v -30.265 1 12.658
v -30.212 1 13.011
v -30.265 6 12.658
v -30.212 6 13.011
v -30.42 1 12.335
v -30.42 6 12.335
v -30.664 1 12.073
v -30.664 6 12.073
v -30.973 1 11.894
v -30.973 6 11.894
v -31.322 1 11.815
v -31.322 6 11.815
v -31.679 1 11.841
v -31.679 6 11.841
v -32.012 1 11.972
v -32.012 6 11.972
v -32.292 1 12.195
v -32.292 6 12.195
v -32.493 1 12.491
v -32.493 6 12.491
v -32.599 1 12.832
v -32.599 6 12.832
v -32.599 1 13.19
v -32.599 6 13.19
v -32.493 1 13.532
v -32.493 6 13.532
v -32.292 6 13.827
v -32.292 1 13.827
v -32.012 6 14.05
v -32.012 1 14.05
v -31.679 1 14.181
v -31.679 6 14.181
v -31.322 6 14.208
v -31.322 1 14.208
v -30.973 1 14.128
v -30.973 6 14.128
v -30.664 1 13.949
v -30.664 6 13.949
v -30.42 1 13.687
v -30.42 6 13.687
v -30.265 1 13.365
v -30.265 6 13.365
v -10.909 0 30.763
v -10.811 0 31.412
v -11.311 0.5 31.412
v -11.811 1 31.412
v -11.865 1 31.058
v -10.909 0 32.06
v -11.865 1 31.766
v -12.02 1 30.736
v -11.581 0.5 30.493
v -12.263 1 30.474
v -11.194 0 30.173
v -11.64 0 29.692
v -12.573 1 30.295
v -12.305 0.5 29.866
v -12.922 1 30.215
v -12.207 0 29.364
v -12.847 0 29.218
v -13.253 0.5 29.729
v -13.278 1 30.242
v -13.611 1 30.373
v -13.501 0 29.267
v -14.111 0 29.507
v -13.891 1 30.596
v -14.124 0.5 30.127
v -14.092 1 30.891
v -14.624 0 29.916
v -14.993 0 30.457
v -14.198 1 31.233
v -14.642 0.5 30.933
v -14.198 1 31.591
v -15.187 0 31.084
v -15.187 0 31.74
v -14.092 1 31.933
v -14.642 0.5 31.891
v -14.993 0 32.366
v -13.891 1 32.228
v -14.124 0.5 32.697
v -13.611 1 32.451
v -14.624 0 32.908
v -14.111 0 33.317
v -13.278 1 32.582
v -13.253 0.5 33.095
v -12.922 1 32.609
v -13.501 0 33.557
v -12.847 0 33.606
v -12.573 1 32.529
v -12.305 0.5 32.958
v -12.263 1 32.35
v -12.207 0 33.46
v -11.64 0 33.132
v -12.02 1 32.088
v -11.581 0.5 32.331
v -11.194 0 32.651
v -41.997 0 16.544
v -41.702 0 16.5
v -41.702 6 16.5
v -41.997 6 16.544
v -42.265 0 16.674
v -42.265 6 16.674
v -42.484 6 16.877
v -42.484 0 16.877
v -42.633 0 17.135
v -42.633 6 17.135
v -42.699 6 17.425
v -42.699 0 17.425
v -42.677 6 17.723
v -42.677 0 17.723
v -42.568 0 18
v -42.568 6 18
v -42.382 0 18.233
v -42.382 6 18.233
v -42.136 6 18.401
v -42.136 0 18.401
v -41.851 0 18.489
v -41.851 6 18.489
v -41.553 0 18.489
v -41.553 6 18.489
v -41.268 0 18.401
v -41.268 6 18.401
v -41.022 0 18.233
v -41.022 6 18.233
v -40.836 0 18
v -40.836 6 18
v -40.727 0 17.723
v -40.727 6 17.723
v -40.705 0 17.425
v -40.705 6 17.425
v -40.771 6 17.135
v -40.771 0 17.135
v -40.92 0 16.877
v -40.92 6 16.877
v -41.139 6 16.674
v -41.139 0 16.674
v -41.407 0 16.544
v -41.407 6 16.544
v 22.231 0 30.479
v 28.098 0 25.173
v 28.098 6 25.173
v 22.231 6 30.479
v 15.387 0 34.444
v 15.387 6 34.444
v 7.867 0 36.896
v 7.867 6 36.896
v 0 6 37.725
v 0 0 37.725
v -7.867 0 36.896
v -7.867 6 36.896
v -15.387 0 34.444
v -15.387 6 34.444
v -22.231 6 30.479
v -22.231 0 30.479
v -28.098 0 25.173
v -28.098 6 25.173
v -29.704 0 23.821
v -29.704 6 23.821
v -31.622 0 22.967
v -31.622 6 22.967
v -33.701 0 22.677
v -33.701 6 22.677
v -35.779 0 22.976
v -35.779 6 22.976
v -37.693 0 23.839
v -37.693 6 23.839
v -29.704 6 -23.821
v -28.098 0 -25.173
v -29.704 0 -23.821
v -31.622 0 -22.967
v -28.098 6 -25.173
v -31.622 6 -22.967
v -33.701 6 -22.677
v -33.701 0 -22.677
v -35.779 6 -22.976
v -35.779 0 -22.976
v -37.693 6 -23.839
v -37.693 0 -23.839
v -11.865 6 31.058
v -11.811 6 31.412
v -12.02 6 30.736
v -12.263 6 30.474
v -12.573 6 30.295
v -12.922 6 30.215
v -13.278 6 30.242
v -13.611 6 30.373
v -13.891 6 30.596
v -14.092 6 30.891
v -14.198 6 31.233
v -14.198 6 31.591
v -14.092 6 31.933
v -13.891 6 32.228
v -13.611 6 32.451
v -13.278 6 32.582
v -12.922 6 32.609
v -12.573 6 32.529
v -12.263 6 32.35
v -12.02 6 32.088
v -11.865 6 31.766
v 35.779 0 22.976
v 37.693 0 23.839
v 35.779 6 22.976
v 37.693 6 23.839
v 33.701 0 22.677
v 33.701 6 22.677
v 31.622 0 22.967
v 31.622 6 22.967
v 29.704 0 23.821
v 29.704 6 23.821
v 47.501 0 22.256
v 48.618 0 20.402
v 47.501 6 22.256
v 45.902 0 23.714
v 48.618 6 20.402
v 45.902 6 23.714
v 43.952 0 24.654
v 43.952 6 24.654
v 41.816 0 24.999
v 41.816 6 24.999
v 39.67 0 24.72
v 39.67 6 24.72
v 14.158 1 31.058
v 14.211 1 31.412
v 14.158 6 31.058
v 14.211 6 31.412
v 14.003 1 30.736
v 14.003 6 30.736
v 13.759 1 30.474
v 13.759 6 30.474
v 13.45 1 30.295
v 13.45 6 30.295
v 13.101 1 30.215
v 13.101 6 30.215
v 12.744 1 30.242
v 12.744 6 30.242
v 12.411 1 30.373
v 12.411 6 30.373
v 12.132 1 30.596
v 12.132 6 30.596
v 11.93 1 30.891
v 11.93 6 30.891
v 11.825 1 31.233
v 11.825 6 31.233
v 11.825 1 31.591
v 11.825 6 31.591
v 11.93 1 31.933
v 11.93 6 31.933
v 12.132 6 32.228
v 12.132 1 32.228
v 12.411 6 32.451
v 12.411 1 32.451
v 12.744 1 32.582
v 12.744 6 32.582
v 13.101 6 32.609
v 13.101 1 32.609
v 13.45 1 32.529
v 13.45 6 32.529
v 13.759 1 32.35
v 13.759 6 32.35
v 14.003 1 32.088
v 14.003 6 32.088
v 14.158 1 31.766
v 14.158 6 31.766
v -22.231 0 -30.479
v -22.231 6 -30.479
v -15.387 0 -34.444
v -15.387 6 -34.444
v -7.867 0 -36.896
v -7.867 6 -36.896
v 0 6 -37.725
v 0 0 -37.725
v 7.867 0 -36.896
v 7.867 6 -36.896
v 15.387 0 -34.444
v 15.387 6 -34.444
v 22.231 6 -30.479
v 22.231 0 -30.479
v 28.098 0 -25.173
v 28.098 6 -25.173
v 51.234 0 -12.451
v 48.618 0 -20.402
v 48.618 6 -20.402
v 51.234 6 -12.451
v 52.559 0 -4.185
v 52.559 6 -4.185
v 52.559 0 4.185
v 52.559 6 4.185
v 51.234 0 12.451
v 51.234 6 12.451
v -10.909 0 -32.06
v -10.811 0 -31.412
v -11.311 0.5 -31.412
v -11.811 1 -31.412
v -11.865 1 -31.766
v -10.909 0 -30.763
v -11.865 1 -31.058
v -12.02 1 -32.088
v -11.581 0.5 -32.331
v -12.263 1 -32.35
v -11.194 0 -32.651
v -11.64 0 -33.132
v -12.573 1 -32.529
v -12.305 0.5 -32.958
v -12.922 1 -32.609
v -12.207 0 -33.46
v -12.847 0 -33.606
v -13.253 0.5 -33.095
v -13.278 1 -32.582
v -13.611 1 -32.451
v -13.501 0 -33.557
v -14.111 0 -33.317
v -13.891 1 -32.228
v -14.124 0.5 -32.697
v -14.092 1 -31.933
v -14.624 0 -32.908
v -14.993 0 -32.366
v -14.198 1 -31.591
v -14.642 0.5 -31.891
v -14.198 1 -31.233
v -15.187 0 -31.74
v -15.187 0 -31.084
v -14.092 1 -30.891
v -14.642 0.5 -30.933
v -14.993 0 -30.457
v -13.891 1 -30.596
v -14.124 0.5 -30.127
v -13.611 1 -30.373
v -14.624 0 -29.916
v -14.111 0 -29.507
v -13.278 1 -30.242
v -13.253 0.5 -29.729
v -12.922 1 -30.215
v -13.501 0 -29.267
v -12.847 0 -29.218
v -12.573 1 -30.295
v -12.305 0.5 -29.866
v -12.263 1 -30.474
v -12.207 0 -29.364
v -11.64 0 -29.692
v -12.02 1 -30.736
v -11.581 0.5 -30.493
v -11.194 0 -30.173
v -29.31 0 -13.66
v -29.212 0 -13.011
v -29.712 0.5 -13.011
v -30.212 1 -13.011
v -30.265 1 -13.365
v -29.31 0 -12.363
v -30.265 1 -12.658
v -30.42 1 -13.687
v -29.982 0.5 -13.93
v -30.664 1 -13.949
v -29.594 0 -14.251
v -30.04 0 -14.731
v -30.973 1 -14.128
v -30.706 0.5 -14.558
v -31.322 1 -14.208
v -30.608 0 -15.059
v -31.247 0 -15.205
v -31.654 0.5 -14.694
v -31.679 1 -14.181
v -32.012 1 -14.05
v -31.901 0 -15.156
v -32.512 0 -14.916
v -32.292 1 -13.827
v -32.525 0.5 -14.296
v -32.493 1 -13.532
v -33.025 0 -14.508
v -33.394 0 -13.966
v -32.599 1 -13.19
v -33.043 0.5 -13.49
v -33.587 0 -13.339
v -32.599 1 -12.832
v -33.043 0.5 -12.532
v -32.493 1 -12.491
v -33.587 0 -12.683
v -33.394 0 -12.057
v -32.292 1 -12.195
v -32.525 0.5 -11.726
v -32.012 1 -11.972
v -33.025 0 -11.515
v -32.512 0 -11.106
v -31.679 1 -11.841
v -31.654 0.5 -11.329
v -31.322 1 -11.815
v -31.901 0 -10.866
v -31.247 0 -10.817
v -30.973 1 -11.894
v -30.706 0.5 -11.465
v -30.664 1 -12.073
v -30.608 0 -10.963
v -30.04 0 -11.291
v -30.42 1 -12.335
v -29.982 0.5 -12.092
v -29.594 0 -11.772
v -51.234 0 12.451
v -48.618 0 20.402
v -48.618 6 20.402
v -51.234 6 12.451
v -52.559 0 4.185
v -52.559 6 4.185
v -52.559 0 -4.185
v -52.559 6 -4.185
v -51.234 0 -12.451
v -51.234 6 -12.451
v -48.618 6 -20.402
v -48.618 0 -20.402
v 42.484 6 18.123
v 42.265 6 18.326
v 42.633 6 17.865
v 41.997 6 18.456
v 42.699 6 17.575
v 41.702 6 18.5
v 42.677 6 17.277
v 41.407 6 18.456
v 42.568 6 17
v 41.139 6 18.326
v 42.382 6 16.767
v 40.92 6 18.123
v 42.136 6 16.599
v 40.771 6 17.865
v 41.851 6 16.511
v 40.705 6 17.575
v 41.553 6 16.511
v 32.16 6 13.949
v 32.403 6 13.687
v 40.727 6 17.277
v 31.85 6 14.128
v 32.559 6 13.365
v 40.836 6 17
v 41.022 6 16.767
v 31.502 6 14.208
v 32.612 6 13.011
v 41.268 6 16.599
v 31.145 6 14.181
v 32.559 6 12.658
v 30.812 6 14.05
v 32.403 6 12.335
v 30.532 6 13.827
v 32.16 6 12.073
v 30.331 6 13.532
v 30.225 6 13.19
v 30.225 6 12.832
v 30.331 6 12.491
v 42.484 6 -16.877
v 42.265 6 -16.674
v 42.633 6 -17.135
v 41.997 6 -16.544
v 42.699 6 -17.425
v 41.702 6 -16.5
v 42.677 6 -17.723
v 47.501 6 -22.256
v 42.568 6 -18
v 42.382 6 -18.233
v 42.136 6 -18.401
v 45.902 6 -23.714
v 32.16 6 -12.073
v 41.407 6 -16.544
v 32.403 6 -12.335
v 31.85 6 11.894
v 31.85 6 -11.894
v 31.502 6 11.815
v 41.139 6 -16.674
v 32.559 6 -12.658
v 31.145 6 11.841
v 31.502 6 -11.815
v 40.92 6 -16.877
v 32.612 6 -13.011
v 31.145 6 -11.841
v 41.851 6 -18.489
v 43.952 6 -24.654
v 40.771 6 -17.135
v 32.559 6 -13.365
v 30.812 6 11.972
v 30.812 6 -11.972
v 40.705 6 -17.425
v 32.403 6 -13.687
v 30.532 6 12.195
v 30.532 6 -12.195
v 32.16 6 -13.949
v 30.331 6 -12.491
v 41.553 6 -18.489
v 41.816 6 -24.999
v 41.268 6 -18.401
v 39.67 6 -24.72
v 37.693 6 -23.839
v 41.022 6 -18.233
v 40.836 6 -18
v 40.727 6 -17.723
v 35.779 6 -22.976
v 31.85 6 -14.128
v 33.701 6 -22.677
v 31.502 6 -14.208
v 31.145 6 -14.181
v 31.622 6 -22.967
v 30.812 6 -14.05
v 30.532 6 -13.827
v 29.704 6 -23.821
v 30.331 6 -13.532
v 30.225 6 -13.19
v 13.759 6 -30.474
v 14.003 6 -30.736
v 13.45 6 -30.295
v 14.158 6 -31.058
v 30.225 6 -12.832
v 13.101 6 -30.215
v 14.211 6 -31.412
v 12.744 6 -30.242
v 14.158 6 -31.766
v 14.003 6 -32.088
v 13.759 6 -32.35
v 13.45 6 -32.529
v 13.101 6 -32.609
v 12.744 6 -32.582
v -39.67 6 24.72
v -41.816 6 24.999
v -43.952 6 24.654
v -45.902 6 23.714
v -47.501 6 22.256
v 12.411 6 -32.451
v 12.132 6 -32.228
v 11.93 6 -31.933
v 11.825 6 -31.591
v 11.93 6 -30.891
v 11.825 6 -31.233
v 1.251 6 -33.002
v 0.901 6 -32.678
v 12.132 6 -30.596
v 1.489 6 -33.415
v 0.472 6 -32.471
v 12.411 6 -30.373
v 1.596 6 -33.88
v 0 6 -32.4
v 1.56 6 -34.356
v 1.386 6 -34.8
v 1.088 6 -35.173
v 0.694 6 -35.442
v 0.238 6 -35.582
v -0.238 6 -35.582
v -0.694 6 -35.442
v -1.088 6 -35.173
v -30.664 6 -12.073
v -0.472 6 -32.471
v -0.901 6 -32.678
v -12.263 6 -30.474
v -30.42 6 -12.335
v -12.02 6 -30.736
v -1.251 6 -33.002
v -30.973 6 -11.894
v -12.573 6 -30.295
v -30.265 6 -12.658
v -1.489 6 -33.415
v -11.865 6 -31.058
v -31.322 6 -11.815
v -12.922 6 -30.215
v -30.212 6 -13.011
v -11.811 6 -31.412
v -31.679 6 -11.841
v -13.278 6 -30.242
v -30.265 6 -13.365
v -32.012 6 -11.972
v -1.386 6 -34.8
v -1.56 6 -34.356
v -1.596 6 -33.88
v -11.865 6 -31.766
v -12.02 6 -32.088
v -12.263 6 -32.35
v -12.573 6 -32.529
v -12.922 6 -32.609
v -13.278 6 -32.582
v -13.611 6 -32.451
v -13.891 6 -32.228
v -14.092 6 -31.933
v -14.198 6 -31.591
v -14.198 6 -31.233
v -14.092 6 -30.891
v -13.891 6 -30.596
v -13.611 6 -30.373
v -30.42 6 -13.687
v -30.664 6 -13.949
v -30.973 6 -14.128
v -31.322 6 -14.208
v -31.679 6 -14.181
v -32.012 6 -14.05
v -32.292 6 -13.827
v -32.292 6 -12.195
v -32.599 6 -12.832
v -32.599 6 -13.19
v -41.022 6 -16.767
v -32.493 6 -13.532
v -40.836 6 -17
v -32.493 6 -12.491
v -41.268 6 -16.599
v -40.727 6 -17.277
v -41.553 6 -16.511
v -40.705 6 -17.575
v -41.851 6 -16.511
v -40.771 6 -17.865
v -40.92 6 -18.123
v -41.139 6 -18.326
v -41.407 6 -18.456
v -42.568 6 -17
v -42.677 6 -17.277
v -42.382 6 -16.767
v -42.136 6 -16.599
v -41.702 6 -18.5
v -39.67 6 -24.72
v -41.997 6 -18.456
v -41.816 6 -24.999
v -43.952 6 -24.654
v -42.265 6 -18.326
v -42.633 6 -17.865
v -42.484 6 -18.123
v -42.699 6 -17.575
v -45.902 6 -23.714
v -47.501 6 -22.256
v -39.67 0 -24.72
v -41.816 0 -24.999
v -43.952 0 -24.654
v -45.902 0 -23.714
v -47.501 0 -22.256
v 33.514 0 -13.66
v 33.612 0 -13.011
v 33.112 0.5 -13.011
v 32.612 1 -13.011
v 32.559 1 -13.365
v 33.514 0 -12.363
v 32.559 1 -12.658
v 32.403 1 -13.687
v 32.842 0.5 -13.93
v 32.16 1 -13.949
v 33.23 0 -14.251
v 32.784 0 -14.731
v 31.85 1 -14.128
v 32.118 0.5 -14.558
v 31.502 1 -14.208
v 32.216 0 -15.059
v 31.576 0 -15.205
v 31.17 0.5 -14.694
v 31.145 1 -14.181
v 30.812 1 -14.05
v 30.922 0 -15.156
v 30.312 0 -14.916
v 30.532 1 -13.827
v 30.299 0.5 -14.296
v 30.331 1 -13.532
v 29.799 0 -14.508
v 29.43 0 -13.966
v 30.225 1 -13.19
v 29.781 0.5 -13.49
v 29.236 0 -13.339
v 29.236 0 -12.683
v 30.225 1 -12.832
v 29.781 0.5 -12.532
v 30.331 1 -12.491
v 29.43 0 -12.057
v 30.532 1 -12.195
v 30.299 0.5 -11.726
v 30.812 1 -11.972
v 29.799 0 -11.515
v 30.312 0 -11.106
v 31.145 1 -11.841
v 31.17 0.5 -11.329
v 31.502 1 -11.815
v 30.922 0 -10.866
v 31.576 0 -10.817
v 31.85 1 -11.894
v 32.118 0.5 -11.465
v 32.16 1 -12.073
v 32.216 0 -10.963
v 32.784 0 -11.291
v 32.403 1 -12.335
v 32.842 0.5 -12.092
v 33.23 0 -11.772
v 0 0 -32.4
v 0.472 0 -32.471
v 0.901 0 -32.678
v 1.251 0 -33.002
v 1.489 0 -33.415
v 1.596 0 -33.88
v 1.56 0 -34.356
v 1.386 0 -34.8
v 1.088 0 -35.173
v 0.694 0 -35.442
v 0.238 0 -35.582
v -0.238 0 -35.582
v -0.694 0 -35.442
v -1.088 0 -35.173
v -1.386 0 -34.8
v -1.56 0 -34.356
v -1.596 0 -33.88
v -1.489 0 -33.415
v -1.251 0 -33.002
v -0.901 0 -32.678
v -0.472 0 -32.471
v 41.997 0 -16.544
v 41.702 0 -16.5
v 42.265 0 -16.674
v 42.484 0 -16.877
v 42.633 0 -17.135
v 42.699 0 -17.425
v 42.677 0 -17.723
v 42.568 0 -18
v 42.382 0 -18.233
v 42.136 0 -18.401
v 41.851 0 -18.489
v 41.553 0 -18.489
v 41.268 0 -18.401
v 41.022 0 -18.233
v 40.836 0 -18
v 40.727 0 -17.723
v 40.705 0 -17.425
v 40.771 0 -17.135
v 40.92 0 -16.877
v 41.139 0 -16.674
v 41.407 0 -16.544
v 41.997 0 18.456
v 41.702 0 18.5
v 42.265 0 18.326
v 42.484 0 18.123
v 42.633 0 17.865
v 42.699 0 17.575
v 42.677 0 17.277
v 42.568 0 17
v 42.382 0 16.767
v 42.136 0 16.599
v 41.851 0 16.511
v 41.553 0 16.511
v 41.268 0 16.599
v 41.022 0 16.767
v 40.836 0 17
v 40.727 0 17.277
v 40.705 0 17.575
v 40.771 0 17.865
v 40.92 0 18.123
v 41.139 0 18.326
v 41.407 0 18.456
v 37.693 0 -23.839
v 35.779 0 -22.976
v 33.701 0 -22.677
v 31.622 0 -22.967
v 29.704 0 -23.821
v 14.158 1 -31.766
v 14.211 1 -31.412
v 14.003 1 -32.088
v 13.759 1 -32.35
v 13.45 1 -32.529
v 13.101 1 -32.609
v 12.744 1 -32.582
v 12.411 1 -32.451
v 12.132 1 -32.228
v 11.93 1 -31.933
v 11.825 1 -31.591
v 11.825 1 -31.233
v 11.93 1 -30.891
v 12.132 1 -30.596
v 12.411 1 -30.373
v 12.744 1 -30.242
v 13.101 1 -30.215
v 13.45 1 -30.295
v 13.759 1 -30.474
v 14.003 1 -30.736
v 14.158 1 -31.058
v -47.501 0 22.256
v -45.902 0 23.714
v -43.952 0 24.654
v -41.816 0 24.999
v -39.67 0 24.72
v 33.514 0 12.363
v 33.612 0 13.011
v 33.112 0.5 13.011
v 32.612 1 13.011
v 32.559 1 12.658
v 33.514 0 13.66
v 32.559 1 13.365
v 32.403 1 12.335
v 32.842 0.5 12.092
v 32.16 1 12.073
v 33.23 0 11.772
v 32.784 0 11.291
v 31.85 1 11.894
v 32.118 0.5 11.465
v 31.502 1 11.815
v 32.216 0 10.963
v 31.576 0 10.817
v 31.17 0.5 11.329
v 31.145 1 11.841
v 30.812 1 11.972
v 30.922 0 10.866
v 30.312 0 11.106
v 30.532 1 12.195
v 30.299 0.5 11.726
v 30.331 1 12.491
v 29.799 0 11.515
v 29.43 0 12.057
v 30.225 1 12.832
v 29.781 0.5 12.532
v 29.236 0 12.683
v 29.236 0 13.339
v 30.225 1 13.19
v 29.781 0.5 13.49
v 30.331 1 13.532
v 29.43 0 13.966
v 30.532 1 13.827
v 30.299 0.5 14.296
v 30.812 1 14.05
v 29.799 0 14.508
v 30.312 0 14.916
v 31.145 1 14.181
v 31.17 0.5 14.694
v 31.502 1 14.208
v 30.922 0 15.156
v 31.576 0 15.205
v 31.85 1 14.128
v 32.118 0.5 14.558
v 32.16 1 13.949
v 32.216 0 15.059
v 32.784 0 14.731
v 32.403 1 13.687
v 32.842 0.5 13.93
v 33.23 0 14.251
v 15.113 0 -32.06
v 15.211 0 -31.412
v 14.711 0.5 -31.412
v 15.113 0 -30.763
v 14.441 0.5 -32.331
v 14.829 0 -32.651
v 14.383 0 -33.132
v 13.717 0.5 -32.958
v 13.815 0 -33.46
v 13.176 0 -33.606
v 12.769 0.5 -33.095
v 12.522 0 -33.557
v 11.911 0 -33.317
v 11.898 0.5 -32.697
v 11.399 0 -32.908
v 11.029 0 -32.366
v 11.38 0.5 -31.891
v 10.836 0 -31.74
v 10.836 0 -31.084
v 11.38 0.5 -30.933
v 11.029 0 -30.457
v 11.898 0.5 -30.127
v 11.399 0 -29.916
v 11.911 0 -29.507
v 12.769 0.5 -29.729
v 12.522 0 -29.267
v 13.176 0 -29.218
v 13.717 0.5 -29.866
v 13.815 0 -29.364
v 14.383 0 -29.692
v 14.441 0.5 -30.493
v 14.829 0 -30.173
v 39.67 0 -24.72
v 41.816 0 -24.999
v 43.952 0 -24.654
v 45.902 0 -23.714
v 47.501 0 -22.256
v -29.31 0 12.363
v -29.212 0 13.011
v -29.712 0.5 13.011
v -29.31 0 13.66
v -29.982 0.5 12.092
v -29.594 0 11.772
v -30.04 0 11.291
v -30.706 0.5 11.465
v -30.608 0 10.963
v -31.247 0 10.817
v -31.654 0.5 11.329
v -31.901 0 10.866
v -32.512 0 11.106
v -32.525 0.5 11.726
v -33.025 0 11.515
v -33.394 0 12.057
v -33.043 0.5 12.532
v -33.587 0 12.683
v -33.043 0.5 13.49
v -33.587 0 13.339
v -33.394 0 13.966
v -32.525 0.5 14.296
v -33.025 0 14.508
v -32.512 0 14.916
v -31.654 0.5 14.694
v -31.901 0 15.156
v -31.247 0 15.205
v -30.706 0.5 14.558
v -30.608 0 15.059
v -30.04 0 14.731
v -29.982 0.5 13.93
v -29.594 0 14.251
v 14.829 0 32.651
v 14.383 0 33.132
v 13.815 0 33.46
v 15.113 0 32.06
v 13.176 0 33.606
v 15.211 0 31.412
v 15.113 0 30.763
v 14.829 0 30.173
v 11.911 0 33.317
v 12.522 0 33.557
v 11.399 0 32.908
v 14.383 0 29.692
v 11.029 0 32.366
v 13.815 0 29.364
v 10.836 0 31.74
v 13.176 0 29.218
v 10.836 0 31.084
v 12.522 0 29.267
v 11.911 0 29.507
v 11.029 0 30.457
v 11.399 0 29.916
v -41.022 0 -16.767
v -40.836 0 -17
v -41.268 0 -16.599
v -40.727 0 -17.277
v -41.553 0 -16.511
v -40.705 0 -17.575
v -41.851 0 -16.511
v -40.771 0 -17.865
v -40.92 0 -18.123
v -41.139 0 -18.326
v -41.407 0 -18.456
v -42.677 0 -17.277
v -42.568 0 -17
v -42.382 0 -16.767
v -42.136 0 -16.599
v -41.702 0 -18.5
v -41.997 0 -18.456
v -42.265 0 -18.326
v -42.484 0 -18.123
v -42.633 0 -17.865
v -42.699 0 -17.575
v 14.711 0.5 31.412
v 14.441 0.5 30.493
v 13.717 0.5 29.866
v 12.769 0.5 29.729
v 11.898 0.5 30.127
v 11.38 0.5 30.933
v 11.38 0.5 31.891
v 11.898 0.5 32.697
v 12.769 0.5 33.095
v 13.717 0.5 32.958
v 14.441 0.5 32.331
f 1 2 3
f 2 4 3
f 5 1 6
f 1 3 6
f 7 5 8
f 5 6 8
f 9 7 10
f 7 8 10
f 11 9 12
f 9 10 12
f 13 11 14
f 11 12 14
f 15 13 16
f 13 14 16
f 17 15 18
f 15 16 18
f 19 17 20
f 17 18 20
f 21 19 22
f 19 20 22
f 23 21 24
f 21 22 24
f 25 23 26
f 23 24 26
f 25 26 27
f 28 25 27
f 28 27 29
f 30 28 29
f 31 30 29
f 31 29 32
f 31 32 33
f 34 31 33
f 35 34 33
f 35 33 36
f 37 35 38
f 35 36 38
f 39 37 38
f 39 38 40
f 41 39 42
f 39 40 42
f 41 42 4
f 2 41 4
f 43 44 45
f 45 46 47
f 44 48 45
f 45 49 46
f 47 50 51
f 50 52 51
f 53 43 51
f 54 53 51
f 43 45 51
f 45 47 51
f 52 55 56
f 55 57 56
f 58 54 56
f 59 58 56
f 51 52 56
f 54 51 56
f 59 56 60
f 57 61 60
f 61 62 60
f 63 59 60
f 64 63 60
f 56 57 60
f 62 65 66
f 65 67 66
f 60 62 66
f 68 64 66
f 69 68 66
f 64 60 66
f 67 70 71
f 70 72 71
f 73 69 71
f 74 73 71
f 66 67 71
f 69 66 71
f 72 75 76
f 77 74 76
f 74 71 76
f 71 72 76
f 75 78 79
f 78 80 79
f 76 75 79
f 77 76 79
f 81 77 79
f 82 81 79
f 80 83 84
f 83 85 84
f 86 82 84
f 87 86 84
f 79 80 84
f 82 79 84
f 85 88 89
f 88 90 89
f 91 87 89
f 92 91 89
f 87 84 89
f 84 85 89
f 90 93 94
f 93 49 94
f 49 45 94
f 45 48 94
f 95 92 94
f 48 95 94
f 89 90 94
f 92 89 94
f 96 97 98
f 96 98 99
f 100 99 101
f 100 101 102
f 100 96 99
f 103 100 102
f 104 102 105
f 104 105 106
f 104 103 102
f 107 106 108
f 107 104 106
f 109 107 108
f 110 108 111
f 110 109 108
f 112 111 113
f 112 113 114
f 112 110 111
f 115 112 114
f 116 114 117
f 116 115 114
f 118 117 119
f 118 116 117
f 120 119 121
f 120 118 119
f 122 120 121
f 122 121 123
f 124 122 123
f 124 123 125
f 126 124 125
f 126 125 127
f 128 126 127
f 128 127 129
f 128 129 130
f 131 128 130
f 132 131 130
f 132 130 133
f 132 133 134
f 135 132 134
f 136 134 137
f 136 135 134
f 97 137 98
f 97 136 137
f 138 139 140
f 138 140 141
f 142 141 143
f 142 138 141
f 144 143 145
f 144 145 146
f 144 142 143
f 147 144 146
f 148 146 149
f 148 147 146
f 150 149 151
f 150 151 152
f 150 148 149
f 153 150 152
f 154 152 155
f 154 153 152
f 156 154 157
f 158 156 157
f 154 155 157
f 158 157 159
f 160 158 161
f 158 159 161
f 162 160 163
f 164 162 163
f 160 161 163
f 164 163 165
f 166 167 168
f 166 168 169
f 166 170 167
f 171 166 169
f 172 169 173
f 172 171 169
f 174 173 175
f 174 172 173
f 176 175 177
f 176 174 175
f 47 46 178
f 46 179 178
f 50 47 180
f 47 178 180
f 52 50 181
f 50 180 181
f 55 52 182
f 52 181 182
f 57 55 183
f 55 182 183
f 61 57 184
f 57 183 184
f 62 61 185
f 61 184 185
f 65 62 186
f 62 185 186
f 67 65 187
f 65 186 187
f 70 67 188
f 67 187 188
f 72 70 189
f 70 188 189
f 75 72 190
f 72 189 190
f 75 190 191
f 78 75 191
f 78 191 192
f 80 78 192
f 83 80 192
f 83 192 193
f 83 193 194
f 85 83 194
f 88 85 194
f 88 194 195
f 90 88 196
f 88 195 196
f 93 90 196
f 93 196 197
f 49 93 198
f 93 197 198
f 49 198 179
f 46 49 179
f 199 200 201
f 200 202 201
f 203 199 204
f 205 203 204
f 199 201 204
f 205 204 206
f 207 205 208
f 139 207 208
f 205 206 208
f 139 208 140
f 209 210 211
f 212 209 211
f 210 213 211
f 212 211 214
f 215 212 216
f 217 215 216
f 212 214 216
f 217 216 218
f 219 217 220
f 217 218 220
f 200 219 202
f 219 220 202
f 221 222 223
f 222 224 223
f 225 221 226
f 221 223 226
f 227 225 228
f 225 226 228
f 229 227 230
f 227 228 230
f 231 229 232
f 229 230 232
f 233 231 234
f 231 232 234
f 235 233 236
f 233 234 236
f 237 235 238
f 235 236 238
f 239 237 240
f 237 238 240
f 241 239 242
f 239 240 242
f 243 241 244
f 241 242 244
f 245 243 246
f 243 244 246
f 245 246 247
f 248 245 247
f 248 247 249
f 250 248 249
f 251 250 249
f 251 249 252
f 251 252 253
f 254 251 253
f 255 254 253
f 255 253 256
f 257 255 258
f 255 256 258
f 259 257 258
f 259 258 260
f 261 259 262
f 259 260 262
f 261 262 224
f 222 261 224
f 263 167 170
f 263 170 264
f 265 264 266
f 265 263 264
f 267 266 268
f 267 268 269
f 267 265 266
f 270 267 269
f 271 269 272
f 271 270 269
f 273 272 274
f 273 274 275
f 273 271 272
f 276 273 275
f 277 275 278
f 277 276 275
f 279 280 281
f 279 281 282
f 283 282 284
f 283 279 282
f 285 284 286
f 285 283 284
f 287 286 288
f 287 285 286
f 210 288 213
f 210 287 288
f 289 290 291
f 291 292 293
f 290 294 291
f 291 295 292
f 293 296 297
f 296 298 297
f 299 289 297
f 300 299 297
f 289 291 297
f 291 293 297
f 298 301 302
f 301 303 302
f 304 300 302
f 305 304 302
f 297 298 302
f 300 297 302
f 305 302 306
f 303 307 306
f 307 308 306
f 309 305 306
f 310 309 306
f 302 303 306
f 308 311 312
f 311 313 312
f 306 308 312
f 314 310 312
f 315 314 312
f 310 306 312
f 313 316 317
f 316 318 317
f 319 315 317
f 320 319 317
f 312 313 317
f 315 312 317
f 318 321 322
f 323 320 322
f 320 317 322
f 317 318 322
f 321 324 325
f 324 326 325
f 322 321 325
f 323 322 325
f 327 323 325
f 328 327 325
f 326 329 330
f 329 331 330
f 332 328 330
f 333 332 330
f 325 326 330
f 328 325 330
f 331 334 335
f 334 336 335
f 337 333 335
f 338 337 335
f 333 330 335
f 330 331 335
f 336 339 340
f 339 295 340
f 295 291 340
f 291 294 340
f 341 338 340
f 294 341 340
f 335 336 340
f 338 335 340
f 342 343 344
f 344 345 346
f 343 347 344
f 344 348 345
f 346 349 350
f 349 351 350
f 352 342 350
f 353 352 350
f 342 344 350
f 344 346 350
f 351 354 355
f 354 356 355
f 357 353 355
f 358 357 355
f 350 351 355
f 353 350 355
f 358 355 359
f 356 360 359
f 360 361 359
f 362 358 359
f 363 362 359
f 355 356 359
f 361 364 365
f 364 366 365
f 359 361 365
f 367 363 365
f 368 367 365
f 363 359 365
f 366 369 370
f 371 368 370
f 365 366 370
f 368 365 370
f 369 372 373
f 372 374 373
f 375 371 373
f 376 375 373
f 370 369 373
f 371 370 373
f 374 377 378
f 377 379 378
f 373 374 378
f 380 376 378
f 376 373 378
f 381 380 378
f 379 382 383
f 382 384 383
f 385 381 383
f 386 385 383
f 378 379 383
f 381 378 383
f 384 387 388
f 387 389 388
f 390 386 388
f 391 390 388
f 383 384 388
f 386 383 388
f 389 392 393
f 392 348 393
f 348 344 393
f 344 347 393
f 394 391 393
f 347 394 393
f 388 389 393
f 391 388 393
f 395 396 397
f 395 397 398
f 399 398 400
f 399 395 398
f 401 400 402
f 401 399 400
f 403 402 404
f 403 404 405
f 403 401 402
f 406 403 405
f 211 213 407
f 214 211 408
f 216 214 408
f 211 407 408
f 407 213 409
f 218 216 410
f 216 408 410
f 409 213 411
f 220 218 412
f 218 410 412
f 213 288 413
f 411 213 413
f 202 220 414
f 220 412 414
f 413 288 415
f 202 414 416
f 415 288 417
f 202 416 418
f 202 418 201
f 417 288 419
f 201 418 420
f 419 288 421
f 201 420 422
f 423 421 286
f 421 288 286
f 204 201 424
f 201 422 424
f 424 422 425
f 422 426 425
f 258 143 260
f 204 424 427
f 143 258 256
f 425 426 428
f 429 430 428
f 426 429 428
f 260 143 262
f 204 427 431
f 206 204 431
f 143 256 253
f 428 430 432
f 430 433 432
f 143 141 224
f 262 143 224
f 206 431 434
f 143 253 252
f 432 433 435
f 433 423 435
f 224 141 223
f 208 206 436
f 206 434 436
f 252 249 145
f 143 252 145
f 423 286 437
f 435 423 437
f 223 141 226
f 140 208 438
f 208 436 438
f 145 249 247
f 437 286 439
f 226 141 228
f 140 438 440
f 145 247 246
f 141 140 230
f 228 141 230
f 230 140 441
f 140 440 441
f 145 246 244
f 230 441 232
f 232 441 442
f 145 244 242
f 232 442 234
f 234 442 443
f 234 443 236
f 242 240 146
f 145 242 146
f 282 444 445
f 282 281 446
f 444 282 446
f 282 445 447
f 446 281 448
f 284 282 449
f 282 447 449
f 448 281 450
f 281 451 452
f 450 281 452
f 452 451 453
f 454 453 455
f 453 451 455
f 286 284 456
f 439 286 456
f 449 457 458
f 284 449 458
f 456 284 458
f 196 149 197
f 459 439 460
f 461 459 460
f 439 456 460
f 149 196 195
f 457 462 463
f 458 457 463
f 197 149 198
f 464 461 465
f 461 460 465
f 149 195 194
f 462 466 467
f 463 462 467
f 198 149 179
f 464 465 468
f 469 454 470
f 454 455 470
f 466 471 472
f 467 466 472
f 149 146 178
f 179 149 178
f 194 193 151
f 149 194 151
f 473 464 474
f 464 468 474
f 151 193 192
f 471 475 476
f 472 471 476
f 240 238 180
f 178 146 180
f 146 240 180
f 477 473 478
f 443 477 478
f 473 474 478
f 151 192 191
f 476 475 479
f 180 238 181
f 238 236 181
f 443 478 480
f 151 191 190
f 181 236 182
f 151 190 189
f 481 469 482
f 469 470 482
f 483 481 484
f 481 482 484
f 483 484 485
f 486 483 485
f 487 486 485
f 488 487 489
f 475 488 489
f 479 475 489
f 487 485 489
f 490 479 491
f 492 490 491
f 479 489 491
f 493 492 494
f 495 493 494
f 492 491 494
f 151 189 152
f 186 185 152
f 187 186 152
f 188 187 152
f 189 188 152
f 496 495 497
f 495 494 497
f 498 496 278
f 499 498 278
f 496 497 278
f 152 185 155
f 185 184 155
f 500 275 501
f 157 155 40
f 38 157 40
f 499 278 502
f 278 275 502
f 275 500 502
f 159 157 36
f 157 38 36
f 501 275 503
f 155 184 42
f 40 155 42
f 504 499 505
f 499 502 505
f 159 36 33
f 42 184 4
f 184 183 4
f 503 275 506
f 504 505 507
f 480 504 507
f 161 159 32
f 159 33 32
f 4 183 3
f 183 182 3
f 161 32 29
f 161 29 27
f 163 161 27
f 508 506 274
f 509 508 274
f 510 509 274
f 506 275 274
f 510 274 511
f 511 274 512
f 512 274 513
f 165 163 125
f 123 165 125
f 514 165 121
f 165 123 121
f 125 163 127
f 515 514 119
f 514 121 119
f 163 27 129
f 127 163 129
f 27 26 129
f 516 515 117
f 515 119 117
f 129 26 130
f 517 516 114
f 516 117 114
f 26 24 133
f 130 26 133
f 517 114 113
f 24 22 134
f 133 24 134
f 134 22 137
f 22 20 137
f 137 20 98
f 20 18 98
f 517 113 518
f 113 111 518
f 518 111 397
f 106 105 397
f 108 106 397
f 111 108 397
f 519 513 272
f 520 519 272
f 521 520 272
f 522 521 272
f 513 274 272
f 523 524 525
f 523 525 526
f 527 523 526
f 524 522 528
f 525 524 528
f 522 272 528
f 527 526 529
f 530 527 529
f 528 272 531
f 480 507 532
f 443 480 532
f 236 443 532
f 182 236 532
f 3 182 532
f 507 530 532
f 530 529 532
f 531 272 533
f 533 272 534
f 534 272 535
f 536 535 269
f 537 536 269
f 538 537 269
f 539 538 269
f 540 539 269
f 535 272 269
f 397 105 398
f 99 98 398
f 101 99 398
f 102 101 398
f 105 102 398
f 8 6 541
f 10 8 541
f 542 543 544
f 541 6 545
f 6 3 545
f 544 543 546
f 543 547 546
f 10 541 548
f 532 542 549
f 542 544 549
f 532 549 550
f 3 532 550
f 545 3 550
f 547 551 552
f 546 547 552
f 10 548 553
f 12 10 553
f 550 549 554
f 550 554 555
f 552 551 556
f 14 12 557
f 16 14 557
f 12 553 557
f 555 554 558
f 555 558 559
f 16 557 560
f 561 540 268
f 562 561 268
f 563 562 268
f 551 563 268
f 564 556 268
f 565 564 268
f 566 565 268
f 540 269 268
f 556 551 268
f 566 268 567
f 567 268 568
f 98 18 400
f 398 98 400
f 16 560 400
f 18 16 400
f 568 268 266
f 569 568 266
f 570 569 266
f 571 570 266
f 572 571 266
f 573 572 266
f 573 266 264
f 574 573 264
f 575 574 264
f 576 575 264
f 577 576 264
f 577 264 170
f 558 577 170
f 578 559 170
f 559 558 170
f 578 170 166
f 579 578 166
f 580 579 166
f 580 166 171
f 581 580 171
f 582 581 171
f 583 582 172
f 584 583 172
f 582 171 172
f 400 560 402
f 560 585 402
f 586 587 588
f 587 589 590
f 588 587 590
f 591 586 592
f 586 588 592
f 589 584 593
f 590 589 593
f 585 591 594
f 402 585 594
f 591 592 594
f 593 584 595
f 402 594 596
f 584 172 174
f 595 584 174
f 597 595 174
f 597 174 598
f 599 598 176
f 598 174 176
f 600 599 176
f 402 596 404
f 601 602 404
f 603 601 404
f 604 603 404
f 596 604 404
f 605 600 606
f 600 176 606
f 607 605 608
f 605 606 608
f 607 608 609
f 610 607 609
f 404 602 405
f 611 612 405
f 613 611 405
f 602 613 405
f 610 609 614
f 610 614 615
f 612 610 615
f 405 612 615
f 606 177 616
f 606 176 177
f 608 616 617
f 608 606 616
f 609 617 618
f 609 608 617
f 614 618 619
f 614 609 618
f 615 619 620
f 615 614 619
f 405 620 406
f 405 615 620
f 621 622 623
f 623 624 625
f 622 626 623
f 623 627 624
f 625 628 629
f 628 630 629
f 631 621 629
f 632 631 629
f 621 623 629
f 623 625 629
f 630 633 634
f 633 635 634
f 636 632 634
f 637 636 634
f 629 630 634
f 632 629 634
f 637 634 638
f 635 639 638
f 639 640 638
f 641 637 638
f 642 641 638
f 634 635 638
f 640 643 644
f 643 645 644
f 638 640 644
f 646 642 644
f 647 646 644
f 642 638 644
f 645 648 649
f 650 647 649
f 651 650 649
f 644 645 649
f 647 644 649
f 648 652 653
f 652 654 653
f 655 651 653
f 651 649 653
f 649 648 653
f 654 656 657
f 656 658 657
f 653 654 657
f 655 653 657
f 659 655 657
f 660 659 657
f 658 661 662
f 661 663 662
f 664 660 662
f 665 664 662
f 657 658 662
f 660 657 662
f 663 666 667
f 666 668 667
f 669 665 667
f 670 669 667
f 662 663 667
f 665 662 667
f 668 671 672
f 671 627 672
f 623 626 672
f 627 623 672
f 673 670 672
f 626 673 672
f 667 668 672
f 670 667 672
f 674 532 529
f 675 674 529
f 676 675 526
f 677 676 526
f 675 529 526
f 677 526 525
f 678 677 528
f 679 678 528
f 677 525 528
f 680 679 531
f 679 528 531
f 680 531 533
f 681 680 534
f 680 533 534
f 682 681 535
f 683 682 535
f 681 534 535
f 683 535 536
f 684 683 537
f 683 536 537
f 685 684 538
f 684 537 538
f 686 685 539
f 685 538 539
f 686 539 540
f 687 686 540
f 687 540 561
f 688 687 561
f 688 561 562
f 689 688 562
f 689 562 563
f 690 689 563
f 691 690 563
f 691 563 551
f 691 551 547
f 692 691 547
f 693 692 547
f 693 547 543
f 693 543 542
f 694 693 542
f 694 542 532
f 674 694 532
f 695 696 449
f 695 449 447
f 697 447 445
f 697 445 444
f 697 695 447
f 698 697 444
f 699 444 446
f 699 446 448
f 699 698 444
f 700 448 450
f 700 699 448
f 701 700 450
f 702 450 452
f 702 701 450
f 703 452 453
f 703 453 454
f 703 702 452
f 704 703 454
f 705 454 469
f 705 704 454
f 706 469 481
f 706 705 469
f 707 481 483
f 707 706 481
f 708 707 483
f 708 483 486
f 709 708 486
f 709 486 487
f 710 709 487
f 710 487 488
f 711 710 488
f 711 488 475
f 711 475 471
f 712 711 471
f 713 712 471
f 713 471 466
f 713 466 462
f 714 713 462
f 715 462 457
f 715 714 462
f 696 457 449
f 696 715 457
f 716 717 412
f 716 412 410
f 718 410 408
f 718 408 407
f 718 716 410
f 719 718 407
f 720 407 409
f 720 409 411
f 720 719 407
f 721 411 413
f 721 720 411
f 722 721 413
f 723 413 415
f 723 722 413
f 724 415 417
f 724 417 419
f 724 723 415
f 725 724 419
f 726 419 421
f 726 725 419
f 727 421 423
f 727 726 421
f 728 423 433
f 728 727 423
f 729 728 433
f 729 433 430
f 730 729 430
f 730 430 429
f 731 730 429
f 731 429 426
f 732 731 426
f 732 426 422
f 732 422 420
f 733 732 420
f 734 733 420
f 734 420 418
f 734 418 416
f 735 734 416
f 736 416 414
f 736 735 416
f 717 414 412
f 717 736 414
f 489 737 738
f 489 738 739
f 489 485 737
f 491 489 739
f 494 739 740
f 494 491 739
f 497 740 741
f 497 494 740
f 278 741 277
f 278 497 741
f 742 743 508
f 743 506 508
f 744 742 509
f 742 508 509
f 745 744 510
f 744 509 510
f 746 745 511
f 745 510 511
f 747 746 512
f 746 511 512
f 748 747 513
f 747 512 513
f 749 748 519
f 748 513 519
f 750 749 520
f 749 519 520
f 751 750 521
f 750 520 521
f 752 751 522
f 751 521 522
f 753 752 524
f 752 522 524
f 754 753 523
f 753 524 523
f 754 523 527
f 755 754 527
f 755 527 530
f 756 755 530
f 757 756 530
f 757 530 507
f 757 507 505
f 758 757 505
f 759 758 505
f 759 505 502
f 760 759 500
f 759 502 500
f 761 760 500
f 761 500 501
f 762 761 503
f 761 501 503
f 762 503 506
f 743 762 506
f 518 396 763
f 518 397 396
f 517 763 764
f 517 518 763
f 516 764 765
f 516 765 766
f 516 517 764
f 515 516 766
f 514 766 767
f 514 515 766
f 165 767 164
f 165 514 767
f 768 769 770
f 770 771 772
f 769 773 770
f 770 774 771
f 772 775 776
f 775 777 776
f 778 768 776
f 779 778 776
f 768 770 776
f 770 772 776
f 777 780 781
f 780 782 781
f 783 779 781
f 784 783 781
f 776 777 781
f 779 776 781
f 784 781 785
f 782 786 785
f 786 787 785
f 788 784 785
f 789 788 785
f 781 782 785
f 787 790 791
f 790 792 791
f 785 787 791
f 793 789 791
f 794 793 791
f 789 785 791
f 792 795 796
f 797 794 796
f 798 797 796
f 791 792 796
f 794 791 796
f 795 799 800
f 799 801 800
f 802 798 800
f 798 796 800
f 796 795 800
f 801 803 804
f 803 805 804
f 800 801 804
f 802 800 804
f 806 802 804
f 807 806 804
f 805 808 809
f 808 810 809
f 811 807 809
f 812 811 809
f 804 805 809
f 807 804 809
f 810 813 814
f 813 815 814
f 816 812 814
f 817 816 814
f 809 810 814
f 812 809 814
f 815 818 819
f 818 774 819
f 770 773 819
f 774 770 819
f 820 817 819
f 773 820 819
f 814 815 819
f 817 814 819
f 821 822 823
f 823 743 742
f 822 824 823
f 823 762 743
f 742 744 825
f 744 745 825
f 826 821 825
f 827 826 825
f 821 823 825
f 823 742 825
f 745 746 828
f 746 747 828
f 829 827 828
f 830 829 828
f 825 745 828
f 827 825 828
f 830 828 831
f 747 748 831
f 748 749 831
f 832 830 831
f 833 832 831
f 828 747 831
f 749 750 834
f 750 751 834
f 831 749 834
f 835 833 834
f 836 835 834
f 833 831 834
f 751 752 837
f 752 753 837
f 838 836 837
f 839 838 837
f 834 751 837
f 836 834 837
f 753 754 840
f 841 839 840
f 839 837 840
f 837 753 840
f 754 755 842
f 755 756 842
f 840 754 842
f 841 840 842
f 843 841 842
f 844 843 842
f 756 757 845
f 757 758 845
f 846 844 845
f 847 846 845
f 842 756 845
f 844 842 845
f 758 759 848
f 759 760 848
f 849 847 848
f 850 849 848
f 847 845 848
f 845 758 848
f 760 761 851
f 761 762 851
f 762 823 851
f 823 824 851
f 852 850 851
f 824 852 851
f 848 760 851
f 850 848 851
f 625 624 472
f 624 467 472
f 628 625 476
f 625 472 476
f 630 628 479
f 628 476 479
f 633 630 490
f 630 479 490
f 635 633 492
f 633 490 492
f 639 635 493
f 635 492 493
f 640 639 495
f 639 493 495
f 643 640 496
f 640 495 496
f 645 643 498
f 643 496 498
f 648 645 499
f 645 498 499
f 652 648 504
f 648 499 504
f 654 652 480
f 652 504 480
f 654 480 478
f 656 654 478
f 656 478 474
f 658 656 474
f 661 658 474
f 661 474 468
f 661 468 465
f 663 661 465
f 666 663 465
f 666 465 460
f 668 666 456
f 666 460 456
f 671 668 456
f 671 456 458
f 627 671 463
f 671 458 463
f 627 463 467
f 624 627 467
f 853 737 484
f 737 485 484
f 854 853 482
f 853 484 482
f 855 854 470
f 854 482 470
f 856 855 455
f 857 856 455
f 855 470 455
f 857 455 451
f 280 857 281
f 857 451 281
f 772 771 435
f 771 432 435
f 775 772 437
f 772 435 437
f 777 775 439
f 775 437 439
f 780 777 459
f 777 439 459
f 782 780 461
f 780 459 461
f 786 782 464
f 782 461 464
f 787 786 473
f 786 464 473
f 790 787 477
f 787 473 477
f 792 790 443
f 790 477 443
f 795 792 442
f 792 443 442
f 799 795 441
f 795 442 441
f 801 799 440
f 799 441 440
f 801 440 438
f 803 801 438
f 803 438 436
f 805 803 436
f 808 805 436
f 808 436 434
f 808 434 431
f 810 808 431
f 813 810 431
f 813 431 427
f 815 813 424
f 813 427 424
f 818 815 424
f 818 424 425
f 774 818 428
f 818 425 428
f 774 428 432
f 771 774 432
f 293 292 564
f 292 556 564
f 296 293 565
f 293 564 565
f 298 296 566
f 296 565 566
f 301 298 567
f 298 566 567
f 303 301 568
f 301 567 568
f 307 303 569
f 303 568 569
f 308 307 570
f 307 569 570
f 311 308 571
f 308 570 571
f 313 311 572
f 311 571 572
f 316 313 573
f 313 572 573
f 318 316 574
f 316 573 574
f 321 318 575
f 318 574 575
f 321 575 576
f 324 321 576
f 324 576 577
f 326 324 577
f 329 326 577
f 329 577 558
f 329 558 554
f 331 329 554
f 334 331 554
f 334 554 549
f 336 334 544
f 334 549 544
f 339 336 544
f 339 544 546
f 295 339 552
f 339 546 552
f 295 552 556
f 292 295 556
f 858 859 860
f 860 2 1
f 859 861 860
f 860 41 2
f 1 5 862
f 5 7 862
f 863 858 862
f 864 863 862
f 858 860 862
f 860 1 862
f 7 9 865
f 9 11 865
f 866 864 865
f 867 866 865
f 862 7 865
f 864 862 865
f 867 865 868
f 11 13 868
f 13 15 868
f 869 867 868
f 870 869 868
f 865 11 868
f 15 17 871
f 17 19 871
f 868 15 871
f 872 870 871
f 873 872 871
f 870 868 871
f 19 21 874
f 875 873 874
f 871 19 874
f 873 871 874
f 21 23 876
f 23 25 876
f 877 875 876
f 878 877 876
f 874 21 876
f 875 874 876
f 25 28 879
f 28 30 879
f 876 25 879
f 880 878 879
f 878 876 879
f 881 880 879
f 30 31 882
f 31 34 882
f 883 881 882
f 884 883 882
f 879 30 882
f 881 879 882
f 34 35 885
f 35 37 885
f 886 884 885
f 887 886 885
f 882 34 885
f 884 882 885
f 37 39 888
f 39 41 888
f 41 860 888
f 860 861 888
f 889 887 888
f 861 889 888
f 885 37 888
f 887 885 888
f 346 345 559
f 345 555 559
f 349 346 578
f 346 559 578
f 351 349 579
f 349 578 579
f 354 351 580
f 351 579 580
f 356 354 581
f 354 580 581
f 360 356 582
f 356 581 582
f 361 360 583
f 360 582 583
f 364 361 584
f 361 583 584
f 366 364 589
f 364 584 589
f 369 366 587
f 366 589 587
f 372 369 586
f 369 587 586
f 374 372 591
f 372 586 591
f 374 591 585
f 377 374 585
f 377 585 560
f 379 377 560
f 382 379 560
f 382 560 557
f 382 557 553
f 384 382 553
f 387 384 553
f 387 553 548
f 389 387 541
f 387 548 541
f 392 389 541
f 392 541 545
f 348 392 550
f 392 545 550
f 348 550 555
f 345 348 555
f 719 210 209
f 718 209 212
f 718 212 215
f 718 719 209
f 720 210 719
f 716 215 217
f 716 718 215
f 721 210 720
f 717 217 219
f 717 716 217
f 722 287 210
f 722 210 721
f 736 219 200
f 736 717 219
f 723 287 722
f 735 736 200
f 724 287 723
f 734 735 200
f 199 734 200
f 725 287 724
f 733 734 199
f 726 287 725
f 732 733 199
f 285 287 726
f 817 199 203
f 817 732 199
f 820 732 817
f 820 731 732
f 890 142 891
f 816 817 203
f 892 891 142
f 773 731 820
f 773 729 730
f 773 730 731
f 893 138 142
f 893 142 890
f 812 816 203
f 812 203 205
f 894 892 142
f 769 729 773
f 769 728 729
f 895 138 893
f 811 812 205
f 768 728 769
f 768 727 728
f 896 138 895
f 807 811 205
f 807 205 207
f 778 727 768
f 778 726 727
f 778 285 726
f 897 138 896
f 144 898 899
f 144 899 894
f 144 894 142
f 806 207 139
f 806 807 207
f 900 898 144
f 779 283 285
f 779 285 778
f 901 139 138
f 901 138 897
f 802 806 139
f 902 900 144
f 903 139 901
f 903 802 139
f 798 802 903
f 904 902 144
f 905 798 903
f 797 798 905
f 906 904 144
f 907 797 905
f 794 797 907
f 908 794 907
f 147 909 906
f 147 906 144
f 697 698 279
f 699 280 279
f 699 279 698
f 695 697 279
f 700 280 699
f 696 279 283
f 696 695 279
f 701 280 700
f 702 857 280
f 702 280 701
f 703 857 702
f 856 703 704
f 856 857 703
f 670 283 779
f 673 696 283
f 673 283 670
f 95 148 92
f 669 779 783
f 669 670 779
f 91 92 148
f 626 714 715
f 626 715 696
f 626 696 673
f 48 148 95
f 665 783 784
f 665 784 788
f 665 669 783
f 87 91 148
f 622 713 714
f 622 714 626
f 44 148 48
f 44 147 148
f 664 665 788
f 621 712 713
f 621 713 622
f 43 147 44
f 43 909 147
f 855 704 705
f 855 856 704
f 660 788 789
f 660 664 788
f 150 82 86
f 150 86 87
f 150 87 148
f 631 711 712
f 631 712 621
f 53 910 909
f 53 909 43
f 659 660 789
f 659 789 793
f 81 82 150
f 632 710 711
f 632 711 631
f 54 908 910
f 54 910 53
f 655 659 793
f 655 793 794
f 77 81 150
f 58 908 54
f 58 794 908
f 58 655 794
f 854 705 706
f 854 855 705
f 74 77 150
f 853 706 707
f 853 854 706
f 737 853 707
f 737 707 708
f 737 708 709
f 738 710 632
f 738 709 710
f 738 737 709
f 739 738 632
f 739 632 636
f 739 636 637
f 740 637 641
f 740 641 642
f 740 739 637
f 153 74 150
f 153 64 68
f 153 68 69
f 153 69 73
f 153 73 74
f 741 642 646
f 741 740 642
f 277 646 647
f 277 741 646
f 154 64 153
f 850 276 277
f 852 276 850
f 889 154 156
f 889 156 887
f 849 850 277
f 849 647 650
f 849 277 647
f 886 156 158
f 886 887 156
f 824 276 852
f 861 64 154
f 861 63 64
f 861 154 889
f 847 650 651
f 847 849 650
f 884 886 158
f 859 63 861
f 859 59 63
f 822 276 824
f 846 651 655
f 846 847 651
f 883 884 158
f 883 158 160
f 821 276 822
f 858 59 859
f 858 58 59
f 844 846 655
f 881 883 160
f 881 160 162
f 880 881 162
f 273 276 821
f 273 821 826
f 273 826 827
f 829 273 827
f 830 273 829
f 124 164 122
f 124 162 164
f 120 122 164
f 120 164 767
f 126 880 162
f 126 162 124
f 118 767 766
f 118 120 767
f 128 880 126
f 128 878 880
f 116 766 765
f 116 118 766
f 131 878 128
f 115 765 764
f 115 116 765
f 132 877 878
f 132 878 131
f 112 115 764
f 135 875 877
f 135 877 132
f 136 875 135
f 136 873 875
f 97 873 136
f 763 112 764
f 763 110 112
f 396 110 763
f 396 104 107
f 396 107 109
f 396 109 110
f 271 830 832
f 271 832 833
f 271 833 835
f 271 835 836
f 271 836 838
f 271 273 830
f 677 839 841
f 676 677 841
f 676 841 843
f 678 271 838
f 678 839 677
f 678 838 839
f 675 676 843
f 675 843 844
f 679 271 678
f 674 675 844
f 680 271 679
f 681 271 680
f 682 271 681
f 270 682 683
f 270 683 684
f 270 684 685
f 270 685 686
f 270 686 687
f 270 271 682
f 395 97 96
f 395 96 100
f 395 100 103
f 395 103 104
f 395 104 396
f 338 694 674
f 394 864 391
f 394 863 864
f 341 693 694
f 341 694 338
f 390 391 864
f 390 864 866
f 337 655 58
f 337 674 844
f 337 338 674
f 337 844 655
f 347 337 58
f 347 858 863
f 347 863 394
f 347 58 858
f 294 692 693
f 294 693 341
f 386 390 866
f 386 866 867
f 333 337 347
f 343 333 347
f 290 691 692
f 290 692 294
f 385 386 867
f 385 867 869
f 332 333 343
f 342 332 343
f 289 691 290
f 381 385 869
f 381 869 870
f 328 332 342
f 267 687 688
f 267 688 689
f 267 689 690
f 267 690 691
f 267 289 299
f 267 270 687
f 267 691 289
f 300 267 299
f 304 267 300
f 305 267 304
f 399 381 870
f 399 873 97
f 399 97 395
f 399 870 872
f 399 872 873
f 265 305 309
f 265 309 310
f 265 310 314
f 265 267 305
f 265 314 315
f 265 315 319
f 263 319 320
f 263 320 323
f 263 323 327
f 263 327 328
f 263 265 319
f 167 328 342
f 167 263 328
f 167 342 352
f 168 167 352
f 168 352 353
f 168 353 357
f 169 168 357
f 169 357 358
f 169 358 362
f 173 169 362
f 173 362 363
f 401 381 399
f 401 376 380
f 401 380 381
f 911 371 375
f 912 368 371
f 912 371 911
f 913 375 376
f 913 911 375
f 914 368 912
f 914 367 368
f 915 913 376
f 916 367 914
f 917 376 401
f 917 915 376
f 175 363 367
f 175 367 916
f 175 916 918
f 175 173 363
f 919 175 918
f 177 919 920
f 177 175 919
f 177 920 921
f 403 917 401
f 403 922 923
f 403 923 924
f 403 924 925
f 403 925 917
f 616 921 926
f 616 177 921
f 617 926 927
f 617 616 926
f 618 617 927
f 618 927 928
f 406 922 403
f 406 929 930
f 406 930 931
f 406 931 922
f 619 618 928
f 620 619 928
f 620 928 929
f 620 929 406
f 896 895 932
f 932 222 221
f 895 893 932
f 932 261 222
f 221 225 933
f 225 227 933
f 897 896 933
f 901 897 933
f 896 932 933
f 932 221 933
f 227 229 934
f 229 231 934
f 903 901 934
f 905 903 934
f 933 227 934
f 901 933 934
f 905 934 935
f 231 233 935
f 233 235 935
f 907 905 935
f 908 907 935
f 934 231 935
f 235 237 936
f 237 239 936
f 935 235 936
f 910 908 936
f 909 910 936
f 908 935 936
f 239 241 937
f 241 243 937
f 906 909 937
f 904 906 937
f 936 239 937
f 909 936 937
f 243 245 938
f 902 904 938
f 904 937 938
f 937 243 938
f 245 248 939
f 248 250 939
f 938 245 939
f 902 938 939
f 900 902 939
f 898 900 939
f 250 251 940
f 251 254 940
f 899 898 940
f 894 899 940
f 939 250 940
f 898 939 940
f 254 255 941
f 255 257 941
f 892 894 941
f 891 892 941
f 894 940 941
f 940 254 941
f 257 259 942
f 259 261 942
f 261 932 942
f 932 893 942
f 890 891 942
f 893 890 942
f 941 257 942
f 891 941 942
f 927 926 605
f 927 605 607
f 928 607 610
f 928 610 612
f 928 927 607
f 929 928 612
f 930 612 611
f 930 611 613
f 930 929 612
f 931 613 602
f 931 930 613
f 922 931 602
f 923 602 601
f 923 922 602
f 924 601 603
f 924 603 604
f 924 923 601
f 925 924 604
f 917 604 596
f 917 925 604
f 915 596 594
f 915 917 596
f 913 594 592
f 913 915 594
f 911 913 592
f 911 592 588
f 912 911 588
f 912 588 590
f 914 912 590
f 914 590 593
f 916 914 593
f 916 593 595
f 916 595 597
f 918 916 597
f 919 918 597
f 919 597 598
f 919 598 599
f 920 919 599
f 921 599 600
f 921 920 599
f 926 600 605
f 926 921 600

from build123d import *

# Parameters (mm, degrees)
SKETCH1_R                                       = 1
BOSS_EXTRUDE1_DEPTH                             = 6
FILLET1_R                                       = 7.5
SKETCH2_R                                       = 1.6
CUT_EXTRUDE1_DEPTH                              = 66.108380797
CSK_FOR_M2_FLAT_HEAD_MACHINE_SCREW1_D           = 2.4
CSK_FOR_M2_FLAT_HEAD_MACHINE_SCREW1_CSINK_D     = 4.4
CSK_FOR_M2_FLAT_HEAD_MACHINE_SCREW1_CSINK_ANGLE = 90


with BuildPart() as part:
    # Sketch1 → Boss-Extrude1 (new body)
    with BuildSketch(Plane(origin=(0, 0, 0), x_dir=(1, 0, 0), z_dir=(0, 1, 0))):
        with BuildLine():
            Line((31.883633055, 20.164562188), (44.561021943, 28.182280752))
            ThreePointArc((44.561021943, 28.182280752), (52.725, 0), (44.561021943, -28.182280752))
            Line((44.561021943, -28.182280752), (31.883633055, -20.164562188))
            ThreePointArc((31.883633055, -20.164562188), (0, -37.725), (-31.883633055, -20.164562188))
            Line((-31.883633055, -20.164562188), (-44.561021943, -28.182280752))
            ThreePointArc((-44.561021943, -28.182280752), (-52.725, 0), (-44.561021943, 28.182280752))
            Line((-44.561021943, 28.182280752), (-31.883633055, 20.164562188))
            ThreePointArc((-31.883633055, 20.164562188), (0, 37.725), (31.883633055, 20.164562188))
        make_face()
        with Locations(Location((-13.0112367, 31.411904105, 0), (0, 0, 270))):
            Circle(SKETCH1_R, mode=Mode.SUBTRACT)
        with Locations(Location((13.0112367, 31.411904105, 0), (0, 0, 270))):
            Circle(SKETCH1_R, mode=Mode.SUBTRACT)
        with Locations(Location((31.411904105, 13.0112367, 0), (0, 0, 270))):
            Circle(SKETCH1_R, mode=Mode.SUBTRACT)
        with Locations(Location((31.411904105, -13.0112367, 0), (0, 0, 270))):
            Circle(SKETCH1_R, mode=Mode.SUBTRACT)
        with Locations(Location((13.0112367, -31.411904105, 0), (0, 0, 270))):
            Circle(SKETCH1_R, mode=Mode.SUBTRACT)
        with Locations(Location((-13.0112367, -31.411904105, 0), (0, 0, 270))):
            Circle(SKETCH1_R, mode=Mode.SUBTRACT)
        with Locations(Location((-31.411904105, -13.0112367, 0), (0, 0, 270))):
            Circle(SKETCH1_R, mode=Mode.SUBTRACT)
        with Locations(Location((-31.411904105, 13.0112367, 0), (0, 0, 270))):
            Circle(SKETCH1_R, mode=Mode.SUBTRACT)
        with Locations(Location((41.701925915, 17.5, 0), (0, 0, 270))):
            Circle(SKETCH1_R, mode=Mode.SUBTRACT)
        with Locations(Location((41.701925915, -17.5, 0), (0, 0, 270))):
            Circle(SKETCH1_R, mode=Mode.SUBTRACT)
        with Locations(Location((-41.701925915, 17.5, 0), (0, 0, 90))):
            Circle(SKETCH1_R, mode=Mode.SUBTRACT)
        with Locations(Location((-41.701925915, -17.5, 0), (0, 0, 90))):
            Circle(SKETCH1_R, mode=Mode.SUBTRACT)
    extrude(amount=BOSS_EXTRUDE1_DEPTH)

    # Fillet1
    fillet1_edges = [part.edges().sort_by_distance(p)[0] for p in [
        (44.561021943, 3, 28.182280752),
        (31.883633055, 3, 20.164562188),
        (-44.561021943, 3, 28.182280752),
        (-31.883633055, 3, 20.164562188),
        (44.561021943, 3, -28.182280752),
        (31.883633055, 3, -20.164562188),
        (-44.561021943, 3, -28.182280752),
        (-31.883633055, 3, -20.164562188),
    ]]
    fillet(fillet1_edges, radius=FILLET1_R - 0.0001)  # a hair under: the kernel refuses the full size

    # Sketch2 → Cut-Extrude1 (cut, through all)
    with BuildSketch(Plane(origin=(0, 6, 0), x_dir=(1, 0, 0), z_dir=(0, 1, 0))):
        with Locations(Location((0, 34, 0), (0, 0, 270))):
            Circle(SKETCH2_R)
    extrude(amount=-CUT_EXTRUDE1_DEPTH, mode=Mode.SUBTRACT)

    # CSK for M2 Flat Head Machine Screw1 (through all)
    with Locations(Plane(origin=(0, 0, 0), x_dir=(-1, 0, 0), z_dir=(0, -1, 0))):
        with Locations((13.0112367, -31.411904105), (-13.0112367, -31.411904105), (-31.411904105, -13.0112367), (-31.411904105, 13.0112367), (-13.0112367, 31.411904105), (13.0112367, 31.411904105), (31.411904105, 13.0112367), (31.411904105, -13.0112367)):
            CounterSinkHole(CSK_FOR_M2_FLAT_HEAD_MACHINE_SCREW1_D / 2, CSK_FOR_M2_FLAT_HEAD_MACHINE_SCREW1_CSINK_D / 2, counter_sink_angle=CSK_FOR_M2_FLAT_HEAD_MACHINE_SCREW1_CSINK_ANGLE)


solid = part.part
